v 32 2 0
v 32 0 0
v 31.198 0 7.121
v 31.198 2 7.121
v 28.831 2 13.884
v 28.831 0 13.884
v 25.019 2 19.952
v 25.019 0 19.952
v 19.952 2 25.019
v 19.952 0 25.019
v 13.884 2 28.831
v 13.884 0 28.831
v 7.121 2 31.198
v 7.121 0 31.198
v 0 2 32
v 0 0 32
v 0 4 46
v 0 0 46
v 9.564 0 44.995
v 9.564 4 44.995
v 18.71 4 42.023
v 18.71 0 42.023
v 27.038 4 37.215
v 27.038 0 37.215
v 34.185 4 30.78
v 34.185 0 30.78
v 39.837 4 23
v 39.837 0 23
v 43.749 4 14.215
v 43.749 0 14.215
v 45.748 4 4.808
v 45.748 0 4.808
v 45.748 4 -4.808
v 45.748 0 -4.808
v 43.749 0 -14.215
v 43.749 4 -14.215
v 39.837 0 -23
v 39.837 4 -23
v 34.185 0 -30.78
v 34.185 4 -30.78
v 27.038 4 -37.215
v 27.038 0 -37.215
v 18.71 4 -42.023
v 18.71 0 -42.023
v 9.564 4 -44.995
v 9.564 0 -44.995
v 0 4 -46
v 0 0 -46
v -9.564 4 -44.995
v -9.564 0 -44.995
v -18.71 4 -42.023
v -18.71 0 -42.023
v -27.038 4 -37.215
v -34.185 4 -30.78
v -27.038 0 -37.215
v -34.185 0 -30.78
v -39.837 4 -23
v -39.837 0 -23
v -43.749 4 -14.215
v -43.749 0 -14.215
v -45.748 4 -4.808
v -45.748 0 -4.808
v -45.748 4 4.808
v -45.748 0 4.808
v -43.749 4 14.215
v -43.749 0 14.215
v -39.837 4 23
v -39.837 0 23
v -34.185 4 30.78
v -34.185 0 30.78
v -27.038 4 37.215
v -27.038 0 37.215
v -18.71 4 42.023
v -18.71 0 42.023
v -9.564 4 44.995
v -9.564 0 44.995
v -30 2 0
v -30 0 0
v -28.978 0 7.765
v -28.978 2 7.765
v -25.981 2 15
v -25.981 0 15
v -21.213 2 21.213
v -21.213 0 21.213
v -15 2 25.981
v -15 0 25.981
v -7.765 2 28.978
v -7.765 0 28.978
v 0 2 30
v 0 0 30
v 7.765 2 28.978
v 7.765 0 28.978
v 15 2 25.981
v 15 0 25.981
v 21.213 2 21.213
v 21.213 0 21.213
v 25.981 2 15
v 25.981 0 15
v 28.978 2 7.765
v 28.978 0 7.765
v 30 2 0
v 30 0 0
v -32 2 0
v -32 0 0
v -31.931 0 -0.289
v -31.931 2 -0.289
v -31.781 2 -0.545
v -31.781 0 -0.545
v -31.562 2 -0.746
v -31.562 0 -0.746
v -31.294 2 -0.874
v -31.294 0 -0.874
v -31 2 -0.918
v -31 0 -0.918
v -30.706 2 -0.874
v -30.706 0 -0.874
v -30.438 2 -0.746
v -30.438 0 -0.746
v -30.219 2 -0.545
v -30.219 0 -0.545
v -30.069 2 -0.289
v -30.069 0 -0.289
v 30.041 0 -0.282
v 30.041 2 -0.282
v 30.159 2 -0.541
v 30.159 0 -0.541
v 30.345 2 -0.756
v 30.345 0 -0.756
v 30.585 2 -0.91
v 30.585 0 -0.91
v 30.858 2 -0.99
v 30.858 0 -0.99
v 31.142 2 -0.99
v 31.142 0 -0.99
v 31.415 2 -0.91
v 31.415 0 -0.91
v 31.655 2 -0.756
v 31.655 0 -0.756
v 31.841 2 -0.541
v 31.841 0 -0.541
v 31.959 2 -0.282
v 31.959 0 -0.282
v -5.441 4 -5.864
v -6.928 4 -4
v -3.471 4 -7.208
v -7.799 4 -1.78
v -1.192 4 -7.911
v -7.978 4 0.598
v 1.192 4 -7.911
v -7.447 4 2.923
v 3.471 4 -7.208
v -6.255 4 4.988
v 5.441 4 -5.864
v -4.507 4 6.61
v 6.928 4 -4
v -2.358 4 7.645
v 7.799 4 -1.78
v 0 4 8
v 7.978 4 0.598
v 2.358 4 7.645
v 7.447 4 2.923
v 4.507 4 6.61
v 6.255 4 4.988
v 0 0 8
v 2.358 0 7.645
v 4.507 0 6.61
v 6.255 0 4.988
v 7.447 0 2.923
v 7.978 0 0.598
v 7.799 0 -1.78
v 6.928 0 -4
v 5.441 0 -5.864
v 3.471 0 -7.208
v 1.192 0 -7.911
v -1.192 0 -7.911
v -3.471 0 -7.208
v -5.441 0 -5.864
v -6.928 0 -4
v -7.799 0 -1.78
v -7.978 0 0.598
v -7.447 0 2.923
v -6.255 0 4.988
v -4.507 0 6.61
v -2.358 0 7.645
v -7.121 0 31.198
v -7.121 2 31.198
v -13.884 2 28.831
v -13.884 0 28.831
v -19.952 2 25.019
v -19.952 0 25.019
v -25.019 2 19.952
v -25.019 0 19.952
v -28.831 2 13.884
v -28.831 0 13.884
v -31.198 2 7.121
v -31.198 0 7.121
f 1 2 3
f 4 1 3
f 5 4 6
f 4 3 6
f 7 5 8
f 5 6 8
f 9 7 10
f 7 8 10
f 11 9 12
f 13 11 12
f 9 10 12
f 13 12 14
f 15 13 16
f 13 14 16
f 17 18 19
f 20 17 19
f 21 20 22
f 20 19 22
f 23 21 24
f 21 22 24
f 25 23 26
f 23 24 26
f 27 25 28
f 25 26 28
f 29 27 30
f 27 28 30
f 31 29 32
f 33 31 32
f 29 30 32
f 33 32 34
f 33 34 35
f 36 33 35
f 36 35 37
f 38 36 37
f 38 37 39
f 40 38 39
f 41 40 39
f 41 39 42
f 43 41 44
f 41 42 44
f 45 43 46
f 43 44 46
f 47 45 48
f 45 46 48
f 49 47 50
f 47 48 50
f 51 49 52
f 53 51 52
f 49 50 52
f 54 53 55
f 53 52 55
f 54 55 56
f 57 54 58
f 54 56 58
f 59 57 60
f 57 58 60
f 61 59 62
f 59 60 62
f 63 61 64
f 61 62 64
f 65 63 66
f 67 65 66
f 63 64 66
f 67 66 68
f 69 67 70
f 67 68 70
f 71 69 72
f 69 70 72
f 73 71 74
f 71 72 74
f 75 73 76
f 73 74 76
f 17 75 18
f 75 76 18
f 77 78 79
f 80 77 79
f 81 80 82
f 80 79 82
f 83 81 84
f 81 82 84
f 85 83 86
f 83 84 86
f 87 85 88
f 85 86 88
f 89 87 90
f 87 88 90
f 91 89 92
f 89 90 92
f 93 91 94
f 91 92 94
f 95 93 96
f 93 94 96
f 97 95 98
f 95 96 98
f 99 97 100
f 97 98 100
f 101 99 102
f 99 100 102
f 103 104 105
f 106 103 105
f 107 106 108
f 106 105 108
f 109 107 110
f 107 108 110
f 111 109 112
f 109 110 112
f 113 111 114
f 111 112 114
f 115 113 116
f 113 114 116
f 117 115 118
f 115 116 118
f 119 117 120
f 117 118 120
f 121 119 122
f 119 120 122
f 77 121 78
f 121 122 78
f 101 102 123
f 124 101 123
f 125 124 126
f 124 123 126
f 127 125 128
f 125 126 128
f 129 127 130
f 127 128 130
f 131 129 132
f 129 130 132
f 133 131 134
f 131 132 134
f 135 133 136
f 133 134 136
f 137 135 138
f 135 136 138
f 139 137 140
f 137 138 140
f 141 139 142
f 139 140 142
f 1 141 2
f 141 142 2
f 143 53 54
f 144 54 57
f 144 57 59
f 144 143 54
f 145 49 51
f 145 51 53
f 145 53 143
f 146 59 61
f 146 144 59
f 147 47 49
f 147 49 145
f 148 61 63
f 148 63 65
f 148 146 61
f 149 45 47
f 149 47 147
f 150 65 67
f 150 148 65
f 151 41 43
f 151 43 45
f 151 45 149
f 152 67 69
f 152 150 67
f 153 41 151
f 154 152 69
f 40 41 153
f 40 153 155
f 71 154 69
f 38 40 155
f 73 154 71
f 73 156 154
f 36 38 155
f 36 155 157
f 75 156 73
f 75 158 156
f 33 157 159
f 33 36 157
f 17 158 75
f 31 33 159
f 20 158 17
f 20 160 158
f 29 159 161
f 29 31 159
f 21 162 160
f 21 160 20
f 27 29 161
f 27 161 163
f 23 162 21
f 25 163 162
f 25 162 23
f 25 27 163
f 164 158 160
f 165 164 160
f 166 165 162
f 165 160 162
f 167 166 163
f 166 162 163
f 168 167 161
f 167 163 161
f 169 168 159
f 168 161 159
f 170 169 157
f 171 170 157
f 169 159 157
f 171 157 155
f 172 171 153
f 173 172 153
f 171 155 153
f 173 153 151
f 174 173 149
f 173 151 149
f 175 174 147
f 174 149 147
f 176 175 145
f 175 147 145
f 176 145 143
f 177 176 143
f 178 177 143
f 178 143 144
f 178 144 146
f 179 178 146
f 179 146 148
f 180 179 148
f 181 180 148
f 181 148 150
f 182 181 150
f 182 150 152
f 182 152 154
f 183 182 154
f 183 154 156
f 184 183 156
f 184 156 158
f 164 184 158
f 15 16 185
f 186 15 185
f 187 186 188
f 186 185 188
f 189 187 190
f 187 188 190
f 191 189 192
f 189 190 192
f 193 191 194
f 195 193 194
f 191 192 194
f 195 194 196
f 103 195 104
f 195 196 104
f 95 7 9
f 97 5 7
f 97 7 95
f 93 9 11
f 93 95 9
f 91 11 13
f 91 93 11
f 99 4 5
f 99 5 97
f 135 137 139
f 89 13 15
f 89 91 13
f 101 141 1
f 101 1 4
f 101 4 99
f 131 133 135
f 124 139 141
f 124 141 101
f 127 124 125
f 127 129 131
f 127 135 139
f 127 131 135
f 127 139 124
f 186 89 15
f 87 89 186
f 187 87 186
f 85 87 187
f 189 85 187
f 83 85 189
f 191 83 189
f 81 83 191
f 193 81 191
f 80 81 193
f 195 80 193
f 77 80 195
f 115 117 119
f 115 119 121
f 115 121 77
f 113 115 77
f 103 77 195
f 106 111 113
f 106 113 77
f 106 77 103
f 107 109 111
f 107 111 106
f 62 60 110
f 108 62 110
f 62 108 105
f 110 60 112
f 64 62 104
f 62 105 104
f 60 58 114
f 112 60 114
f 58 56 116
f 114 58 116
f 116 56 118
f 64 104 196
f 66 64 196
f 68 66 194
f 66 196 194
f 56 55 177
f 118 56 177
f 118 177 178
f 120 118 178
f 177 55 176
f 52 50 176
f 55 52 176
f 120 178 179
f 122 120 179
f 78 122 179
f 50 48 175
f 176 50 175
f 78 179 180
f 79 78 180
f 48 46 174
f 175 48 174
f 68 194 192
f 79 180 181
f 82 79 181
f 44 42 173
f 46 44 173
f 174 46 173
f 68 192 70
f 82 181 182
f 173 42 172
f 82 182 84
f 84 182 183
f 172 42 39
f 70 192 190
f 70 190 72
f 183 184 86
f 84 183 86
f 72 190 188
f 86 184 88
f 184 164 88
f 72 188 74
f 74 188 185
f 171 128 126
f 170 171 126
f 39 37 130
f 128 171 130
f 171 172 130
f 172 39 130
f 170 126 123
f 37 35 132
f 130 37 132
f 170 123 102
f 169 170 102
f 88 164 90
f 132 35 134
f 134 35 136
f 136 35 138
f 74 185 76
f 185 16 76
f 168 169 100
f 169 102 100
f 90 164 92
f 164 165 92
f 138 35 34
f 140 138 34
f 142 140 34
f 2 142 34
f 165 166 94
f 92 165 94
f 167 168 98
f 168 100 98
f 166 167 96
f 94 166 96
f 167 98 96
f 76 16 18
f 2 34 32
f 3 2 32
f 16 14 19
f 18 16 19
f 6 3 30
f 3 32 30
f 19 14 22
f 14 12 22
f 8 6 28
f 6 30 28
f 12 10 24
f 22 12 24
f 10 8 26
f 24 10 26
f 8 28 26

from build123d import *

# Parameters (mm, degrees)
ESQUISSE1_R             = 46
BOSS_EXTRU_1_DEPTH      = 4
ESQUISSE2_R             = 8
ENL_V_MAT_EXTRU_1_DEPTH = 4.5
ENL_V_MAT_EXTRU_2_DEPTH = 2


with BuildPart() as part:
    # Esquisse1 → Boss.-Extru.1 (new body)
    with BuildSketch(Plane(origin=(0, 0, 0), x_dir=(1, 0, 0), z_dir=(0, 1, 0))):
        with Locations(Location((0, 0, 0), (0, 0, 270))):
            Circle(ESQUISSE1_R)
    extrude(amount=BOSS_EXTRU_1_DEPTH)

    # Esquisse2 → Enlèv. mat.-Extru.1 (cut)
    with BuildSketch(Plane(origin=(0, 4, 0), x_dir=(1, 0, 0), z_dir=(0, 1, 0))):
        with Locations(Location((0, 0, 0), (0, 0, 270))):
            Circle(ESQUISSE2_R)
    extrude(amount=-ENL_V_MAT_EXTRU_1_DEPTH, mode=Mode.SUBTRACT)

    # Esquisse3 → Enlèv. mat.-Extru.2 (cut)
    with BuildSketch(Plane(origin=(0, 0, 0), x_dir=(-1, 0, 0), z_dir=(0, -1, 0))):
        with BuildLine():
            ThreePointArc((0, -32), (22.627416998, -22.627416998), (32, 0))
            ThreePointArc((32, 0), (31, 0.918210565), (30, 0))
            ThreePointArc((30, 0), (0, -30), (-30, 0))
            ThreePointArc((-30, 0), (-31, 1), (-32, 0))
            ThreePointArc((-32, 0), (-22.627416998, -22.627416998), (0, -32))
        make_face()
    extrude(amount=-ENL_V_MAT_EXTRU_2_DEPTH, mode=Mode.SUBTRACT)


solid = part.part
